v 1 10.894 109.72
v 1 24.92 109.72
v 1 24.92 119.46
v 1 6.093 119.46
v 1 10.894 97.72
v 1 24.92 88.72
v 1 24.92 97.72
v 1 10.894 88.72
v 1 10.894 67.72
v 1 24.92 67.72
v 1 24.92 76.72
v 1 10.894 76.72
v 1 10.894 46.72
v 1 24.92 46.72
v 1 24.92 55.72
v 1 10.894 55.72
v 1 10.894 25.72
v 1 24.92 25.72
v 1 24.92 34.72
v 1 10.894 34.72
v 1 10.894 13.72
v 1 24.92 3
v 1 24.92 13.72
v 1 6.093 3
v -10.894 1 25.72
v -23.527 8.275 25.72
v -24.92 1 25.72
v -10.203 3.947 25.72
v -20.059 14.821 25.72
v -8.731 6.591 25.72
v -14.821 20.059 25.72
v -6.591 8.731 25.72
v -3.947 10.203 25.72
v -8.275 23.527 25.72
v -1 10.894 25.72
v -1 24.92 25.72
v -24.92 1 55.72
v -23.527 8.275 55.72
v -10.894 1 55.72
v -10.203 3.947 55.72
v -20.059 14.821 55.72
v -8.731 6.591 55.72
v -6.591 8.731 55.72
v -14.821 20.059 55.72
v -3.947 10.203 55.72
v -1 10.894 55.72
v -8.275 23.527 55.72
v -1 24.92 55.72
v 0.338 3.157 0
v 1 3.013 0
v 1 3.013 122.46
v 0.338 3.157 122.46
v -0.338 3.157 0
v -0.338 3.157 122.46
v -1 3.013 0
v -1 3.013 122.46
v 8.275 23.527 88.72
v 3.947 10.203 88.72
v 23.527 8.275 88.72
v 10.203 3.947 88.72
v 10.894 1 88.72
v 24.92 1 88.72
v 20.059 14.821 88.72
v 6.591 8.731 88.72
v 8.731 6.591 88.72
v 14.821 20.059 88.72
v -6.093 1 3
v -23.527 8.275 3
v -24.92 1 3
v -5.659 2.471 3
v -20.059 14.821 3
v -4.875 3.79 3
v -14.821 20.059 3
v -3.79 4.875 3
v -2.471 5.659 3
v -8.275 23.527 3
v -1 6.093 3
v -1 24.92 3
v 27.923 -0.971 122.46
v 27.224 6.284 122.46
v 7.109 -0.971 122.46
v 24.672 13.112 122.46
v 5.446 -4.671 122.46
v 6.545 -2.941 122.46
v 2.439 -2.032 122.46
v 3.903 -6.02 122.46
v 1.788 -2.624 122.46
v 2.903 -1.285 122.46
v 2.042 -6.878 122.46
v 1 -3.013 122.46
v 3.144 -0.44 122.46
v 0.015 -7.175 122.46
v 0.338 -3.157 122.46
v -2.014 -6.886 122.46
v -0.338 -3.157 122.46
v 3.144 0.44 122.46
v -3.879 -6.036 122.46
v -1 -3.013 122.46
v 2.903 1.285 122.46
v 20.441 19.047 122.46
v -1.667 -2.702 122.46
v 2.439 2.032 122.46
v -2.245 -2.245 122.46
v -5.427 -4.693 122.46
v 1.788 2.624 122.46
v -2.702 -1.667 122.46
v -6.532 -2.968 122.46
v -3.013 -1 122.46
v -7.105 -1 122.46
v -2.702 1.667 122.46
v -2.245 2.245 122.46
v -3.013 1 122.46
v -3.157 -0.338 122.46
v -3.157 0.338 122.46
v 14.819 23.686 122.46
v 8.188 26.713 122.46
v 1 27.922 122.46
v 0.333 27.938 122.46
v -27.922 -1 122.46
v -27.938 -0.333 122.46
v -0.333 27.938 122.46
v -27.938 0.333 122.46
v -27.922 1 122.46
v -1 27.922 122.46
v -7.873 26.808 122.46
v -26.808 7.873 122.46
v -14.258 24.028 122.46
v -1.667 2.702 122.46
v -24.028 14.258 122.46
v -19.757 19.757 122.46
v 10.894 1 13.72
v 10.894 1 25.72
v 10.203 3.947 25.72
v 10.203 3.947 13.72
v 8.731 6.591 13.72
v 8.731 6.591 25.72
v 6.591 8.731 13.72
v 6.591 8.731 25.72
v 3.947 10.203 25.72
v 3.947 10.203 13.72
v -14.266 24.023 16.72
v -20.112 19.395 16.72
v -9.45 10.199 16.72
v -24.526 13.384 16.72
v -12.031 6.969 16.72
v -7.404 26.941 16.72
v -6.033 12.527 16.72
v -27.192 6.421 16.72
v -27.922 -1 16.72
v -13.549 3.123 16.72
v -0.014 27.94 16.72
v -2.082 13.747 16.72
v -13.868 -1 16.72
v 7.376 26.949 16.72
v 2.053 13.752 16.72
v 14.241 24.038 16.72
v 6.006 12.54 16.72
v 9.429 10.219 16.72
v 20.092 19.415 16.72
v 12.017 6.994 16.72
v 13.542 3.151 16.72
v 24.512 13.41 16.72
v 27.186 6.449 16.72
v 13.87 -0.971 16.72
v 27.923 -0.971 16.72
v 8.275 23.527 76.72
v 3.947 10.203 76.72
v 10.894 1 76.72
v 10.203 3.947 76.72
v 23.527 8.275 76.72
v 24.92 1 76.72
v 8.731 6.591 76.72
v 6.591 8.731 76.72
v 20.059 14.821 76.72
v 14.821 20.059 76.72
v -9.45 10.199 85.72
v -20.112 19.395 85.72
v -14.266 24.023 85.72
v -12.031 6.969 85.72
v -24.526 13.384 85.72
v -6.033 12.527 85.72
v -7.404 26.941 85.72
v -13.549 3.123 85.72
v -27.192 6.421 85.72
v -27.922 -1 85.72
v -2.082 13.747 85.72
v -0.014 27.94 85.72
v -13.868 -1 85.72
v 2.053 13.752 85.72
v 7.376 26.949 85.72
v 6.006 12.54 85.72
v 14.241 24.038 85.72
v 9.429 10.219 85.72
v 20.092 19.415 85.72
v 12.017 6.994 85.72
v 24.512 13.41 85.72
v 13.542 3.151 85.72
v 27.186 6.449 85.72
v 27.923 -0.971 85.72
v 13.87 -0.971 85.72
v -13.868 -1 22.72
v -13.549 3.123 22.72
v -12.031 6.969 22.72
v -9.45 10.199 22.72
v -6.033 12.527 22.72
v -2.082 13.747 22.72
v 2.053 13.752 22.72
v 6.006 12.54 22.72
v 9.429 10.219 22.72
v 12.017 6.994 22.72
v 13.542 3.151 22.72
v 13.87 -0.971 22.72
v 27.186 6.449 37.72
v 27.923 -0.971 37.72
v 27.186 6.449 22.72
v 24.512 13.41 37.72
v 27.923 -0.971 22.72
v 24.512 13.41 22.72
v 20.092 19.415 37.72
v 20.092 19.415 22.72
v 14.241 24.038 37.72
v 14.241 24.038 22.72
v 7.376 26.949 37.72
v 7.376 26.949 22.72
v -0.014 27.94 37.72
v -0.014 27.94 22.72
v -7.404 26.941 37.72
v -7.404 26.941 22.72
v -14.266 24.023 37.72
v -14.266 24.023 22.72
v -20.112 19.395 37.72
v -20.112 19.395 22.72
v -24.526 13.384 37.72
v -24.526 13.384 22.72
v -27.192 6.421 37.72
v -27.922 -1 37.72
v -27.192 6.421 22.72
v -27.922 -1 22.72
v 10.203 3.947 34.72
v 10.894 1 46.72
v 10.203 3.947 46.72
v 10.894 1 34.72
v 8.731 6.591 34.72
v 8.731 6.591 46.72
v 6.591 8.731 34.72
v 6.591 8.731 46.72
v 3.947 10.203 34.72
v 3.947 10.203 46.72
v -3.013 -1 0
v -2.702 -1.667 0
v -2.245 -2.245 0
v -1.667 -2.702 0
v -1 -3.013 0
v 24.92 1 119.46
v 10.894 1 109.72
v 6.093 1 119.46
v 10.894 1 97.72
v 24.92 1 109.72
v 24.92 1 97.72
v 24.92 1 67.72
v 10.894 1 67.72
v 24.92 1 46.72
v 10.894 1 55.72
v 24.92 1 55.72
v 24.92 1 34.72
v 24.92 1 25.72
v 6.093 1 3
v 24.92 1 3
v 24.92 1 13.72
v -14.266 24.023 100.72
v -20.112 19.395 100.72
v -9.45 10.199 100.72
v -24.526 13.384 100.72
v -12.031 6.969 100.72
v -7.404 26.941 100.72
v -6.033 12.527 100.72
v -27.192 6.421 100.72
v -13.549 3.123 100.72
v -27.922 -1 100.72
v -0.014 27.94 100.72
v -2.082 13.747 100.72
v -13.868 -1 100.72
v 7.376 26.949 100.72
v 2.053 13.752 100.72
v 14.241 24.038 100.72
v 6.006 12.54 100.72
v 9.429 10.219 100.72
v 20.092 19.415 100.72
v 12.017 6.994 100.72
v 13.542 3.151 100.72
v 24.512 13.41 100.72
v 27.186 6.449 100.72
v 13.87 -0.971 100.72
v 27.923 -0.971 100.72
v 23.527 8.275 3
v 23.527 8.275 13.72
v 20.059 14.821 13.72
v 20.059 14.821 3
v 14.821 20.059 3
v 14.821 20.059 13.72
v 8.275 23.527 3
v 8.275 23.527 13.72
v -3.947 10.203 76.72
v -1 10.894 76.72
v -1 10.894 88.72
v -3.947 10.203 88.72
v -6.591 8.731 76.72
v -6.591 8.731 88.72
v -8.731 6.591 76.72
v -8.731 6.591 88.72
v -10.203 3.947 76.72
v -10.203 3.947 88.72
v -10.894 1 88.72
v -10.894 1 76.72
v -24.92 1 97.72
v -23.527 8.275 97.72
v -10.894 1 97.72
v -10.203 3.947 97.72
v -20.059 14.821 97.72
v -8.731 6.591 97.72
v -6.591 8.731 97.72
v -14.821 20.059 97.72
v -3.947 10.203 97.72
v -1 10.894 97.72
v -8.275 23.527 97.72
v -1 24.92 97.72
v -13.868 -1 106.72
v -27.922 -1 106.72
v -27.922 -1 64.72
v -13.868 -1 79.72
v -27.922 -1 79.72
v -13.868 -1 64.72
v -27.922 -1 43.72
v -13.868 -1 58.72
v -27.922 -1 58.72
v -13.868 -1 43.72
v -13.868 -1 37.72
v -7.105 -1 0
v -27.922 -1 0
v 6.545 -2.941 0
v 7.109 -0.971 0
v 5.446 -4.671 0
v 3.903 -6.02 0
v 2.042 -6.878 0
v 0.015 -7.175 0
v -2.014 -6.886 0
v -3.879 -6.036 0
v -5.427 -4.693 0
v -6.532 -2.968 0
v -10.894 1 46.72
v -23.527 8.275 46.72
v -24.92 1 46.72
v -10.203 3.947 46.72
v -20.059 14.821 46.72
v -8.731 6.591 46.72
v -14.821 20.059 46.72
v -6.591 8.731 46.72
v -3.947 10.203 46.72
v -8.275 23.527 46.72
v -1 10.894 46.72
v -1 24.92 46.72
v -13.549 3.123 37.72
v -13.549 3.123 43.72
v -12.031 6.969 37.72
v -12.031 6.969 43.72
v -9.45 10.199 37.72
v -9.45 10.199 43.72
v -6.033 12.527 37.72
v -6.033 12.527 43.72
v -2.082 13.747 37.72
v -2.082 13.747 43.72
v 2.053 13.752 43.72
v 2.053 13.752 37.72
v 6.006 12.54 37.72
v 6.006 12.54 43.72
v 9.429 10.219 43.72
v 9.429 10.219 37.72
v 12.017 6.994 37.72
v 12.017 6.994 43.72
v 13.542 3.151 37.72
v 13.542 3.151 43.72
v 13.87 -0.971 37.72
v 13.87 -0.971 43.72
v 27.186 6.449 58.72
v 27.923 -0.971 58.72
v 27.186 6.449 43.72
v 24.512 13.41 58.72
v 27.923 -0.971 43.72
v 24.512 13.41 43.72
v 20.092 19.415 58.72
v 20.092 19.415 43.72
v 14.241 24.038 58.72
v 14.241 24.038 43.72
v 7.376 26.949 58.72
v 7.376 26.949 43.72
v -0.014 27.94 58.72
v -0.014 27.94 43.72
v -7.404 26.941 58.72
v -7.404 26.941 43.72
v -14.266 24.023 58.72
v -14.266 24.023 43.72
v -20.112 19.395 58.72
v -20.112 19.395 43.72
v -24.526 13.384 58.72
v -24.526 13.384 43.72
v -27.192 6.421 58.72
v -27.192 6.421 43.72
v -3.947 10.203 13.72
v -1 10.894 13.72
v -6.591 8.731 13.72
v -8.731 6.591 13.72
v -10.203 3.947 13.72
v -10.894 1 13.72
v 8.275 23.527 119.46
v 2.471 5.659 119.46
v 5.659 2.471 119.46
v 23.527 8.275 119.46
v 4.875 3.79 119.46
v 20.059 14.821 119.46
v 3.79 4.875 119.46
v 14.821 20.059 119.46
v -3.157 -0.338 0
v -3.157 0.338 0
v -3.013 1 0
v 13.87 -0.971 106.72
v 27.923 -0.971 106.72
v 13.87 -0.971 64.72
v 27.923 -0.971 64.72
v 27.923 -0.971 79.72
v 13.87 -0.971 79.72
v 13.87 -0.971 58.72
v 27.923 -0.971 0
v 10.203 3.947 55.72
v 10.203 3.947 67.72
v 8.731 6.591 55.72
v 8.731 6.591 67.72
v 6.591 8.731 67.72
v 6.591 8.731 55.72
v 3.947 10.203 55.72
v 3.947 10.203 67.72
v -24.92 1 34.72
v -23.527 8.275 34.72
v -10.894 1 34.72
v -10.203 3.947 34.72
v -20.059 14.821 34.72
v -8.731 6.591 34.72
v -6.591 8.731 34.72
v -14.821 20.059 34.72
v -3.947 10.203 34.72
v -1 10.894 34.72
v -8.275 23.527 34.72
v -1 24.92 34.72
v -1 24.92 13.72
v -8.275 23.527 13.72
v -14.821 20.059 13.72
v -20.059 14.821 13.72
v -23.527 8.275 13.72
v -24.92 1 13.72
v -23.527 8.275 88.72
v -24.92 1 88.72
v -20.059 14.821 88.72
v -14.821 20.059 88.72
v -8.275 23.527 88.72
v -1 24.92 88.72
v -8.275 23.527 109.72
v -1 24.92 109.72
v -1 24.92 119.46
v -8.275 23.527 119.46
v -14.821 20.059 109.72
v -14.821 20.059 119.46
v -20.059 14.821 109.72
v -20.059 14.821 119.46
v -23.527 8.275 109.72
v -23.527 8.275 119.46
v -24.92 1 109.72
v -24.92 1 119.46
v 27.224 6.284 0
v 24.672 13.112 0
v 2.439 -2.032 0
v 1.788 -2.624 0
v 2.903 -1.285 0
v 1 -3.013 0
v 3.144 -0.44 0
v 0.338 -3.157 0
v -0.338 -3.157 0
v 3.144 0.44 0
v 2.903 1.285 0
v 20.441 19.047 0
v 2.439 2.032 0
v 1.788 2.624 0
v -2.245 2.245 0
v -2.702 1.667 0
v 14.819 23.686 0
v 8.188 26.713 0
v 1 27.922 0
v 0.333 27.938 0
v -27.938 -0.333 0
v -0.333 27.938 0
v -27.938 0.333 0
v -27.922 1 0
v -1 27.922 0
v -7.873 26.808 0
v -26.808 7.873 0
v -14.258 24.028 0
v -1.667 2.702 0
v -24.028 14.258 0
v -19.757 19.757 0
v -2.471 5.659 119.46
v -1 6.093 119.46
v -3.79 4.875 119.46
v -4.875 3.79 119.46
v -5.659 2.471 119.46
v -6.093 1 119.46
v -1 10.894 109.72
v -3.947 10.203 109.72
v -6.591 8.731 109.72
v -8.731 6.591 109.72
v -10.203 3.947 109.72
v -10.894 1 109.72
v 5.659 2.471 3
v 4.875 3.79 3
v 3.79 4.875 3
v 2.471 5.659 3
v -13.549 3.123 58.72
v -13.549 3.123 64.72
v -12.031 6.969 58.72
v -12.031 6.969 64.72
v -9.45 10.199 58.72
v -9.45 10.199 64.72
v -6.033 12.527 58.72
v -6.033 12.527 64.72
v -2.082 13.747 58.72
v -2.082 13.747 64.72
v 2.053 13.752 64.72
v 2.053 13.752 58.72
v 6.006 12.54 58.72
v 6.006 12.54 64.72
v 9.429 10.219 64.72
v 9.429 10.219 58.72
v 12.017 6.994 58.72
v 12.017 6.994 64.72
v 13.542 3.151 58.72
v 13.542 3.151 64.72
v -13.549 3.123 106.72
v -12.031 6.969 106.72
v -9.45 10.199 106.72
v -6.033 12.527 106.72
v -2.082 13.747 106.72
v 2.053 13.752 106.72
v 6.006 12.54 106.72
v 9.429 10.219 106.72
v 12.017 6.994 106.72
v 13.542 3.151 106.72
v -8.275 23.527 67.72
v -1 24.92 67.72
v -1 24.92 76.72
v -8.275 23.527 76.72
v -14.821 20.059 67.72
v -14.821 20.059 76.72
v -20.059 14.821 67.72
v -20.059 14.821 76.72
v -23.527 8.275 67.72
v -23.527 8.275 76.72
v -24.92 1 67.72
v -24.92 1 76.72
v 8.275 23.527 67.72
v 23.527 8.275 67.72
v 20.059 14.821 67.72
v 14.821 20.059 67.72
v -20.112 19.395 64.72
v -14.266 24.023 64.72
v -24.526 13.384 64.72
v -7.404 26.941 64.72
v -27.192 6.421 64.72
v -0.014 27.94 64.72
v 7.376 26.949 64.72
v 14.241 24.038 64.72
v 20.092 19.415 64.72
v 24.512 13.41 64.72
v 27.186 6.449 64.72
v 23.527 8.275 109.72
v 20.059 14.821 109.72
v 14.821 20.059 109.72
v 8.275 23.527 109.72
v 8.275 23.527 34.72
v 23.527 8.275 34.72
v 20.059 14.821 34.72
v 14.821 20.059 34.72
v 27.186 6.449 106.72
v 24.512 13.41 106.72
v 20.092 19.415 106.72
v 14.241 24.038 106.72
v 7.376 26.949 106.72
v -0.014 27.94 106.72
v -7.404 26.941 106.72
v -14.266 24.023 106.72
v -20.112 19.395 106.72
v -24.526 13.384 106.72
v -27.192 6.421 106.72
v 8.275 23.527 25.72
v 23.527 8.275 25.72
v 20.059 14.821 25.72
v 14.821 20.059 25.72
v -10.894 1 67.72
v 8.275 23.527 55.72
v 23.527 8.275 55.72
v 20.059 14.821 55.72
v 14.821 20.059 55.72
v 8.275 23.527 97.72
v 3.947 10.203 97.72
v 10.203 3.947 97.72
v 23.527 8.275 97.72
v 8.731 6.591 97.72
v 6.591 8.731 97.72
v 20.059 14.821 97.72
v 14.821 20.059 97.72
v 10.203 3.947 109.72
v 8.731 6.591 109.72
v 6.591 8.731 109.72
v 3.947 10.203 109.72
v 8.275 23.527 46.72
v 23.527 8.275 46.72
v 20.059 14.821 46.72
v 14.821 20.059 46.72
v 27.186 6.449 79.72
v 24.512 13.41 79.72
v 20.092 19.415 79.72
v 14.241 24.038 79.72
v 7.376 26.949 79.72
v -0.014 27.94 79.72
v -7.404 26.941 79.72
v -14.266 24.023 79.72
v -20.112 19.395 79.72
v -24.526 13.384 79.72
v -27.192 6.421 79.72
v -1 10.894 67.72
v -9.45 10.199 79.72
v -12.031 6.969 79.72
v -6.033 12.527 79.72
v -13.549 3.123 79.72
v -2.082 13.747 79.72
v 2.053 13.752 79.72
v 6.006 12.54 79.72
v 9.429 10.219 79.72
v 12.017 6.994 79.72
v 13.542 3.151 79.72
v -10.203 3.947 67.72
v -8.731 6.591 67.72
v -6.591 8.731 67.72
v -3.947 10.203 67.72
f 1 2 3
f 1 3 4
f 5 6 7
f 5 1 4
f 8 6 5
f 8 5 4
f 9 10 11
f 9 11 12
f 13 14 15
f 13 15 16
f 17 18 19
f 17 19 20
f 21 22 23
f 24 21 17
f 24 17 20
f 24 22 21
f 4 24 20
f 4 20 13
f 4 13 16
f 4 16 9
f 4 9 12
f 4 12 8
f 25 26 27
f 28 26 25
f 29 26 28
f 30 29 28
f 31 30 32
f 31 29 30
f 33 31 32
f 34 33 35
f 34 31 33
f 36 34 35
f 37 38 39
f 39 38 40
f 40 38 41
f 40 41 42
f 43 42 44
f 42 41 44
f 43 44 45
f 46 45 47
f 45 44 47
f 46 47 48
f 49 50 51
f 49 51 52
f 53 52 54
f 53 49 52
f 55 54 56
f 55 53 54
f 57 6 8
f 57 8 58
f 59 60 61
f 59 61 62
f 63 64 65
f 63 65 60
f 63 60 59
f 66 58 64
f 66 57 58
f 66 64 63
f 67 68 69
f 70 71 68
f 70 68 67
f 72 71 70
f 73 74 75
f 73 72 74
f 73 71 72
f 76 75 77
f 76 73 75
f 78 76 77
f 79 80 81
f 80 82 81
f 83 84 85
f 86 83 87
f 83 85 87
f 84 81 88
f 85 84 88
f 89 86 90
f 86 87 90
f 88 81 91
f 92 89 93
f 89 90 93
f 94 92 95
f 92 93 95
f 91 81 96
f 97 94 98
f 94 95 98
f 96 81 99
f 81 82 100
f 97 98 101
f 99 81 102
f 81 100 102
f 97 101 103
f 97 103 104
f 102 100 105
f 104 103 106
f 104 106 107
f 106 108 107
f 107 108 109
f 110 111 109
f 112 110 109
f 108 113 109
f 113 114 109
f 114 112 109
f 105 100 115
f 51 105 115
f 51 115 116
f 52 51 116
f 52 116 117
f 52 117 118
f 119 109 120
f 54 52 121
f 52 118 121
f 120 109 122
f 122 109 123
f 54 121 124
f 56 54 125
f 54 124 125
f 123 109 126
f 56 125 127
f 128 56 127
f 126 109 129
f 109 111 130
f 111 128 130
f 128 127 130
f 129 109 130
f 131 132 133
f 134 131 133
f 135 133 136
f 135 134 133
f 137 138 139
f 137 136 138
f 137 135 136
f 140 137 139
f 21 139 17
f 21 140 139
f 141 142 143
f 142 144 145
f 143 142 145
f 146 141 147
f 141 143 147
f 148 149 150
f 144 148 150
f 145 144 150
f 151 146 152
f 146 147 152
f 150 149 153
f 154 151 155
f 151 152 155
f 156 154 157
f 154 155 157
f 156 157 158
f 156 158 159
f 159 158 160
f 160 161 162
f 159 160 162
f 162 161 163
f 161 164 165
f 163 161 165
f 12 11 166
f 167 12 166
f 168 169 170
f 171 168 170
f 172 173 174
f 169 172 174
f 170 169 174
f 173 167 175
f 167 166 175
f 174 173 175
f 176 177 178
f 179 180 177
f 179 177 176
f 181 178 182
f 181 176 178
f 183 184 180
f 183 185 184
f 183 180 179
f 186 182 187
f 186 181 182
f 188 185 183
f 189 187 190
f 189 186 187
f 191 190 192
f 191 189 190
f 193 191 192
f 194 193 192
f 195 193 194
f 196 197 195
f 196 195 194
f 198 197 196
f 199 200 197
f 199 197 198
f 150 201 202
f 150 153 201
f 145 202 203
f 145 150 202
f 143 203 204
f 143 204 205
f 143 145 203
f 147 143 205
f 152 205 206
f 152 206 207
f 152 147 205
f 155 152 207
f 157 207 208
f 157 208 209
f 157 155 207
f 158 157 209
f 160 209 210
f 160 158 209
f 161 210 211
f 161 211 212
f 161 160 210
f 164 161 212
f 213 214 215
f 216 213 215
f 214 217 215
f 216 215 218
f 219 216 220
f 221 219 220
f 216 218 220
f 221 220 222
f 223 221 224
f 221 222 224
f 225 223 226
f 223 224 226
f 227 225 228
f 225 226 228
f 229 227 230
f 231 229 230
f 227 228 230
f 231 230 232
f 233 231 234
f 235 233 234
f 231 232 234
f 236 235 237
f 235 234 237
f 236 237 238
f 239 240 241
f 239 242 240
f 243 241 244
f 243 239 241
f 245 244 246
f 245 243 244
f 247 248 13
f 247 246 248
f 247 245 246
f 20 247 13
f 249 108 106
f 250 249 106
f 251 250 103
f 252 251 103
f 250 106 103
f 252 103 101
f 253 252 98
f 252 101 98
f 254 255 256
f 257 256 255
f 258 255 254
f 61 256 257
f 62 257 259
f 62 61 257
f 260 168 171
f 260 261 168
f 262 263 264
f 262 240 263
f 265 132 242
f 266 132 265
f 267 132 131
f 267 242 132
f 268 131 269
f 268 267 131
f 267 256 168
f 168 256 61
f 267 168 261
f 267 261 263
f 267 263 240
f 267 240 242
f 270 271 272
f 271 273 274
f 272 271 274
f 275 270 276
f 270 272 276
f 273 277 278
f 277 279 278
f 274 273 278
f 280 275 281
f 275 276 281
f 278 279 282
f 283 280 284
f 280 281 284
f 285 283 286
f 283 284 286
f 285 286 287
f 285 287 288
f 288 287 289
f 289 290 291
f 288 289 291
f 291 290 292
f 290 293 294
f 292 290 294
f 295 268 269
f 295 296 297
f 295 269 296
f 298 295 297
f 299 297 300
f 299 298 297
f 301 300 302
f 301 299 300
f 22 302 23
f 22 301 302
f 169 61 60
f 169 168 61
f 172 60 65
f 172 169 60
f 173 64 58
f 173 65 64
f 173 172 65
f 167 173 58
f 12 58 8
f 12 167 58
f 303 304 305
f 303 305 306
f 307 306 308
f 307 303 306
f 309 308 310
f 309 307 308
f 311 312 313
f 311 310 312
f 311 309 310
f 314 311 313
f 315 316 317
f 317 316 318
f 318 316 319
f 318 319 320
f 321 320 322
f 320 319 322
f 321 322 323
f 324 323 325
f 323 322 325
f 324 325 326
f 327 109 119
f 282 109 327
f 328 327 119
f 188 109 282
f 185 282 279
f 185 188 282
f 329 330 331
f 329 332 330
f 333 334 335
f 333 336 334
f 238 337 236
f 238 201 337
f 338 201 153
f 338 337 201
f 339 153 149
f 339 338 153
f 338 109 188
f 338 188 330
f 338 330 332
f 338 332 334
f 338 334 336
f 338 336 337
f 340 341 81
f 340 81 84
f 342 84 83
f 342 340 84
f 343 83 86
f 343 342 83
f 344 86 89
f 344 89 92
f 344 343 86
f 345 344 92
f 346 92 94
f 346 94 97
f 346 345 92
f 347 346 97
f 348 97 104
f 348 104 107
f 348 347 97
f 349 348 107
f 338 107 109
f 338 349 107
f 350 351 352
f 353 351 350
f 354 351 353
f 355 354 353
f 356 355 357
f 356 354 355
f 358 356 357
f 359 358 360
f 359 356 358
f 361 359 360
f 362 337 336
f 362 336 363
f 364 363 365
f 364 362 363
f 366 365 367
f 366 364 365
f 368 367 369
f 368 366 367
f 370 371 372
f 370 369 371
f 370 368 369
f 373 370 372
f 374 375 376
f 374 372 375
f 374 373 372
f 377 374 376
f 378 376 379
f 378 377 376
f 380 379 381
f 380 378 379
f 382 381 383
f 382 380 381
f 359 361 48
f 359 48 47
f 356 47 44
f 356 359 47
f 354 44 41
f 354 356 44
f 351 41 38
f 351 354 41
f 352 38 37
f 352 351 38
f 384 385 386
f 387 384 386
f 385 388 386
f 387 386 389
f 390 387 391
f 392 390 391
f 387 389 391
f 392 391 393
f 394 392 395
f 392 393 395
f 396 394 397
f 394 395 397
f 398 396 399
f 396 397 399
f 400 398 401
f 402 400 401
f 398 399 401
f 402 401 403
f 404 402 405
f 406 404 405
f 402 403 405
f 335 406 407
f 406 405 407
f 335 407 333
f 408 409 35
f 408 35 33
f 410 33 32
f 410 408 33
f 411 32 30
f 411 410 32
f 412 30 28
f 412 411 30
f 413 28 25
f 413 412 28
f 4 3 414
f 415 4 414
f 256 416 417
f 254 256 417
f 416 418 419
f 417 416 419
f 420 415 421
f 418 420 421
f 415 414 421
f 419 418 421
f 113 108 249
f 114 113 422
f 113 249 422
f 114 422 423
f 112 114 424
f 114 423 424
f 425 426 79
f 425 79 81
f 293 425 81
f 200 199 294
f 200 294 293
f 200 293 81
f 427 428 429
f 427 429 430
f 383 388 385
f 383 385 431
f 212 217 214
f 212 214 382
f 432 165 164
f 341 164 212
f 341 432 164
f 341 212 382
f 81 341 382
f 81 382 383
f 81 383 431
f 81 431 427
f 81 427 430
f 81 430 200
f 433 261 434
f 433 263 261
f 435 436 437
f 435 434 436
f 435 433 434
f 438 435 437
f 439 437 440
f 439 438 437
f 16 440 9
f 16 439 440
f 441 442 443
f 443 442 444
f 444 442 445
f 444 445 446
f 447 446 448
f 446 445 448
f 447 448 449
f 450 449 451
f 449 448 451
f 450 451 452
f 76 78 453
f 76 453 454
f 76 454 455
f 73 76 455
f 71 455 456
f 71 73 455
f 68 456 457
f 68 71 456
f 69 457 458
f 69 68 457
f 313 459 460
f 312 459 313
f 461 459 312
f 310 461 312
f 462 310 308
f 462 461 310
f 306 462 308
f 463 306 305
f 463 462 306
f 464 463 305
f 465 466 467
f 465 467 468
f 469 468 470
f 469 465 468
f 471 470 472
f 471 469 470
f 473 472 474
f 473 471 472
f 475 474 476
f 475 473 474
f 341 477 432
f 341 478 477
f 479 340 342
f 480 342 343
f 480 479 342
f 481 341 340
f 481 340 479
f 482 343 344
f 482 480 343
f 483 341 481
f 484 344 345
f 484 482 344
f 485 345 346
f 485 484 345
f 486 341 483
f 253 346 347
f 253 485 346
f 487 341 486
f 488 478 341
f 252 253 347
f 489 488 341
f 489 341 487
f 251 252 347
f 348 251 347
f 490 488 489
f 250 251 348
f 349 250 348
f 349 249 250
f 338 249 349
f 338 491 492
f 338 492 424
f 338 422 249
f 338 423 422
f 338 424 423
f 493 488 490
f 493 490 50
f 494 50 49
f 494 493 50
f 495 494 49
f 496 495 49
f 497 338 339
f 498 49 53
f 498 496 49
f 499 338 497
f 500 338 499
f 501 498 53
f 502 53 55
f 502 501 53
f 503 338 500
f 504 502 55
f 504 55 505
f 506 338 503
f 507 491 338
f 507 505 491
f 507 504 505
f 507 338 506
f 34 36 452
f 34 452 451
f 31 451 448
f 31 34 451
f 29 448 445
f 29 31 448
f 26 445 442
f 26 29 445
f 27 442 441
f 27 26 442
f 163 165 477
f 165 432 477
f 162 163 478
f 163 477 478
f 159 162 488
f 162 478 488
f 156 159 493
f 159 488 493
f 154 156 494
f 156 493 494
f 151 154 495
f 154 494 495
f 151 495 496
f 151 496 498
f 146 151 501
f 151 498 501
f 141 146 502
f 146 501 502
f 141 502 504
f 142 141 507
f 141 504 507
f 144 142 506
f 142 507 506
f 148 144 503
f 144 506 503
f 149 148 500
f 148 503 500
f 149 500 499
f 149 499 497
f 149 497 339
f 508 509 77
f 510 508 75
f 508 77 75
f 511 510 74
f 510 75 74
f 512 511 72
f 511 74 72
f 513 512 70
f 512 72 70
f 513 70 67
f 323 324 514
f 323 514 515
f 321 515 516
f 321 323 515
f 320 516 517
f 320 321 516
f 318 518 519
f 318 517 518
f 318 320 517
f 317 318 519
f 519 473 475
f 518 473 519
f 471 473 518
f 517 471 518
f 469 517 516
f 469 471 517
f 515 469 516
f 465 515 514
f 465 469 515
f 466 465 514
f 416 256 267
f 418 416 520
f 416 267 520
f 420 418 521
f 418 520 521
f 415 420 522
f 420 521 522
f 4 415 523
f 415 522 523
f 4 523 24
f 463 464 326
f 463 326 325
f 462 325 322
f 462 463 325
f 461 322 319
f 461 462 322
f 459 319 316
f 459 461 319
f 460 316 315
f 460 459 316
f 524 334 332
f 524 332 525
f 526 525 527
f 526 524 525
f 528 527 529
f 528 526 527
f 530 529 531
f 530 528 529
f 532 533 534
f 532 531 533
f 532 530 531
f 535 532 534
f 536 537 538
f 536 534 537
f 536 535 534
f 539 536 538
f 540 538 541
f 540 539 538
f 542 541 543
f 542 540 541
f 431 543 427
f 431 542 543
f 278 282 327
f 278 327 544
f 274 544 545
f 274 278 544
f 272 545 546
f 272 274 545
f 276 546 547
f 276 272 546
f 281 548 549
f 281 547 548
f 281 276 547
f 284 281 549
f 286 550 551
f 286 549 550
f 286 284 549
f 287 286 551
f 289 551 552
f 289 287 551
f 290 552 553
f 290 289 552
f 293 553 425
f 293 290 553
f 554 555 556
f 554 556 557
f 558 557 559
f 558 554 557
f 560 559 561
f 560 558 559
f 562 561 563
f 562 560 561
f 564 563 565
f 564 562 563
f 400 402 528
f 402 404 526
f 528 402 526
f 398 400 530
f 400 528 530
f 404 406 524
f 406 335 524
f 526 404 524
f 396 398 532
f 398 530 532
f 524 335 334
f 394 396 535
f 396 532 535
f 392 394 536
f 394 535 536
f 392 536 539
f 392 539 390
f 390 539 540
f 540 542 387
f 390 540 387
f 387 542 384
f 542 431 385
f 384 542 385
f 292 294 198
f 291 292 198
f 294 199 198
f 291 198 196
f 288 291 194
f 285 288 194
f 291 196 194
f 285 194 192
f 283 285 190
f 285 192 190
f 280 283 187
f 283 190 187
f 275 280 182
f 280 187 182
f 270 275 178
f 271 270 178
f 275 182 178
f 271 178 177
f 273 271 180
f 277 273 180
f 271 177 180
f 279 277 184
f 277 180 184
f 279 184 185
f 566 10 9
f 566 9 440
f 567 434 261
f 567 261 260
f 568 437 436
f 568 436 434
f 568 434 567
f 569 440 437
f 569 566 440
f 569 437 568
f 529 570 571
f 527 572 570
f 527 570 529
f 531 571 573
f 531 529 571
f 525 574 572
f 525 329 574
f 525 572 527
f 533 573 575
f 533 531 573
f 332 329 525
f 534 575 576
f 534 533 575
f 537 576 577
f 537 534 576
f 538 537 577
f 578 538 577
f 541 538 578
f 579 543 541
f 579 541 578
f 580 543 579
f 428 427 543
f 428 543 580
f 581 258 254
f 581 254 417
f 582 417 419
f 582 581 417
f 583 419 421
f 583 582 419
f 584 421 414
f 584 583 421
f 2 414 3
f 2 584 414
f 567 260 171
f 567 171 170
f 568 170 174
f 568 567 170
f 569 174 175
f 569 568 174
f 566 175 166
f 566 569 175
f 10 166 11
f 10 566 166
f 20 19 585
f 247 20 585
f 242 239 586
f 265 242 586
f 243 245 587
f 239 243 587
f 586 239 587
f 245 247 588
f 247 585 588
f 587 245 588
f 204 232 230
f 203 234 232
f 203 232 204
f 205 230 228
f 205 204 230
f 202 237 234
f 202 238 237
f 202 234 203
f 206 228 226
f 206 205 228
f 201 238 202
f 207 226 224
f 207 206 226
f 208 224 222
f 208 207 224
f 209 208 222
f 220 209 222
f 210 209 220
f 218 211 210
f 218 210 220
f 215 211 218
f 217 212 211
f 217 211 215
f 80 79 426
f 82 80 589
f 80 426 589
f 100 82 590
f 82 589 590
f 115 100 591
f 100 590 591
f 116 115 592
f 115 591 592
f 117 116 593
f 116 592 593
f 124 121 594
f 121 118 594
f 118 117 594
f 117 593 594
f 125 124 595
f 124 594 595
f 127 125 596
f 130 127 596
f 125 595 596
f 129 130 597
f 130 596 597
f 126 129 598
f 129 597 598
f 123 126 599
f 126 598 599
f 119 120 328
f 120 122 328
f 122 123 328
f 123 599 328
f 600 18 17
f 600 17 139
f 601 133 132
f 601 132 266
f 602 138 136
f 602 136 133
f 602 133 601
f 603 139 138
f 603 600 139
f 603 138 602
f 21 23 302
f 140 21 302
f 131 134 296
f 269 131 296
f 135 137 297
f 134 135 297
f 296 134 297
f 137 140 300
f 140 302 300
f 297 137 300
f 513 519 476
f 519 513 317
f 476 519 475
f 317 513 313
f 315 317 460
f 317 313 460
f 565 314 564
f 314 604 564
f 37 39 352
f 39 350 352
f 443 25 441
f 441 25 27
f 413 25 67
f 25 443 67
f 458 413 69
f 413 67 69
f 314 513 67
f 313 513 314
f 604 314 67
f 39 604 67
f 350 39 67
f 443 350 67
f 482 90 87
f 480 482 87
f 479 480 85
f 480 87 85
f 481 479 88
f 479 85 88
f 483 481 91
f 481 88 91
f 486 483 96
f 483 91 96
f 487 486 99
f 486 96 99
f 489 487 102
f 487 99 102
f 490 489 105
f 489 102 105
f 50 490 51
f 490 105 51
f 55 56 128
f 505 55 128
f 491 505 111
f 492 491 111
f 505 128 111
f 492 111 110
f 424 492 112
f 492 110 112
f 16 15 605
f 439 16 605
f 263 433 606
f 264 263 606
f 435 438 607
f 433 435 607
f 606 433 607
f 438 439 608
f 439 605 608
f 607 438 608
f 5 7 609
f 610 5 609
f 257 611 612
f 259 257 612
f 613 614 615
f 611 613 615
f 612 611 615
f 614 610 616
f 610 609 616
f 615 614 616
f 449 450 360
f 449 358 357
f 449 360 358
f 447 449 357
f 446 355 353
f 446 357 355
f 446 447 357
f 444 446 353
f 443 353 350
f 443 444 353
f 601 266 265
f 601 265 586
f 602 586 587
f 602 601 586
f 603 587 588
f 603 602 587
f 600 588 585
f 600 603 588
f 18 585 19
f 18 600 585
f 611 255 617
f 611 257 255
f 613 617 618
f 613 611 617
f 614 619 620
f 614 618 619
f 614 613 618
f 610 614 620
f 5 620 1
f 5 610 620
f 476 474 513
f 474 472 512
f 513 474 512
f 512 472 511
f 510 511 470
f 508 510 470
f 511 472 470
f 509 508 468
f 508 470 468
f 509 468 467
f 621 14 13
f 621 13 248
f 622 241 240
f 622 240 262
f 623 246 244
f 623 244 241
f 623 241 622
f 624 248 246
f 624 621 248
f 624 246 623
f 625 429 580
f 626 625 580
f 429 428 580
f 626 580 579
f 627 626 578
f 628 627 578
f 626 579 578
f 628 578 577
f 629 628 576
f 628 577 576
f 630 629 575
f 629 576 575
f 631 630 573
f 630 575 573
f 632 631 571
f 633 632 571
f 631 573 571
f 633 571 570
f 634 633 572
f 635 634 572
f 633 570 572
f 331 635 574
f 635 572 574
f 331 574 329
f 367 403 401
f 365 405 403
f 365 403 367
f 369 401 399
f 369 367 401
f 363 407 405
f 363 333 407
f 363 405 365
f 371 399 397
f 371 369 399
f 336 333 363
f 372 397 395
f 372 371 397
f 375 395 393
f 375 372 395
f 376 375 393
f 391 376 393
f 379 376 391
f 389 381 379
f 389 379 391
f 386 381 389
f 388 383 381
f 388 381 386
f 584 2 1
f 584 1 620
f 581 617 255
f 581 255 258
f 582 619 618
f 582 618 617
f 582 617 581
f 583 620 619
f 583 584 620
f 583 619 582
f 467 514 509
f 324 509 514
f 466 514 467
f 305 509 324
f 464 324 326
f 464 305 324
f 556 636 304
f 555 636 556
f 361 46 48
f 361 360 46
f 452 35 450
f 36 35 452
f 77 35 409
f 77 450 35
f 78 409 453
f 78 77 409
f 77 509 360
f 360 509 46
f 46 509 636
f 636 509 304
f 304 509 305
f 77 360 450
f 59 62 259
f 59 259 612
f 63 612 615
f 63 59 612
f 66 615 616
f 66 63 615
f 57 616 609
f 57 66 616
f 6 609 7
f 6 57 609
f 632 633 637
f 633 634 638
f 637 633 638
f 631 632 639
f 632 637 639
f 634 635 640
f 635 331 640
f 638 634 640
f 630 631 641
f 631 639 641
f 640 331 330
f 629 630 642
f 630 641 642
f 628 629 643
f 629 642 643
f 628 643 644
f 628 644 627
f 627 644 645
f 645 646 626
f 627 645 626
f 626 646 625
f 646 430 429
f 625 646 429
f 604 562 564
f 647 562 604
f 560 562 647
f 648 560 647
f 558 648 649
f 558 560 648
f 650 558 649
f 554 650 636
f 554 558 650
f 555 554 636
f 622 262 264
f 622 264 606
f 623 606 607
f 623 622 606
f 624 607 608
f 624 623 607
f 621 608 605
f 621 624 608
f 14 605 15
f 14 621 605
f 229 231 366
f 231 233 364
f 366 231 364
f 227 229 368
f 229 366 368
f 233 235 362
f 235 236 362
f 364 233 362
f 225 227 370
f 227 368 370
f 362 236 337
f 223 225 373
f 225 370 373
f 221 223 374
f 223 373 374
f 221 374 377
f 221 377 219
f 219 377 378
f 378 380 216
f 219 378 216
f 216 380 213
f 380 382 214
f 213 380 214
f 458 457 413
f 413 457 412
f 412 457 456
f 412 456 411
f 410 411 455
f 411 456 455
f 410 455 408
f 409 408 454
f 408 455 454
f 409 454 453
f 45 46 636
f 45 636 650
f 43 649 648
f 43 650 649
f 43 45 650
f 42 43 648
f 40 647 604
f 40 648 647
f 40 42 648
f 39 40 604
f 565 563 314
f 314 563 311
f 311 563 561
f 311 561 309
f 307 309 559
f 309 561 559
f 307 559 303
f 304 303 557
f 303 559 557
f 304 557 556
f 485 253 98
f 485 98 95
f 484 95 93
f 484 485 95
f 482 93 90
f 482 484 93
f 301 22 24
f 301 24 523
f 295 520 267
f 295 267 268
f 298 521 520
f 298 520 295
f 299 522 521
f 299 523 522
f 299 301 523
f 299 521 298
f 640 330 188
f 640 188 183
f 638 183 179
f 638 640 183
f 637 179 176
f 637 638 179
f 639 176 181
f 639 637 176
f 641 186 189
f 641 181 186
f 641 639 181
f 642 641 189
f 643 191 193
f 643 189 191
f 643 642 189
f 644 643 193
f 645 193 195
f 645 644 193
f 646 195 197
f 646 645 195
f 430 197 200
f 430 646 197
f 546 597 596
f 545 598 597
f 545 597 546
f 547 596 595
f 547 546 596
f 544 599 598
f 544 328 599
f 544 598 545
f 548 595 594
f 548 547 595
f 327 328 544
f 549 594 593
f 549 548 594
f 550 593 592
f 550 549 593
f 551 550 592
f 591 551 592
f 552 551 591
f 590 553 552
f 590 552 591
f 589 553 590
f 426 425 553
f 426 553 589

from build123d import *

# Parameters (mm, degrees)
SKETCH3_R            = 27.94
BOSS_EXTRUDE2_DEPTH  = 122.46
SKETCH5_R            = 3.175
CUT_EXTRUDE1_DEPTH   = 129.676877488
SKETCH4_W            = 14
SKETCH4_H            = 6
SHELL1_START         = 3
SHELL1_OUTLINE_R     = 10.94
SHELL1_OUTLINE_R_2   = 6.175
SHELL1_DEPTH         = 116.46
SHELL1_2_OUTLINE_R   = 24.94
SHELL1_2_OUTLINE_R_2 = 10.94
SHELL1_2_DEPTH       = 10.72
SHELL1_START_2       = 109.72
SHELL1_3_OUTLINE_R   = 24.94
SHELL1_3_OUTLINE_R_2 = 10.94
SHELL1_3_DEPTH       = 9.74
SHELL1_START_3       = 25.72
SHELL1_4_OUTLINE_R   = 24.94
SHELL1_4_OUTLINE_R_2 = 10.94
SHELL1_4_DEPTH       = 9
SHELL1_START_4       = 46.72
SHELL1_5_OUTLINE_R   = 24.94
SHELL1_5_OUTLINE_R_2 = 10.94
SHELL1_5_DEPTH       = 9
SHELL1_START_5       = 67.72
SHELL1_6_OUTLINE_R   = 24.94
SHELL1_6_OUTLINE_R_2 = 10.94
SHELL1_6_DEPTH       = 9
SHELL1_START_6       = 88.72
SHELL1_7_OUTLINE_R   = 24.94
SHELL1_7_OUTLINE_R_2 = 10.94
SHELL1_7_DEPTH       = 9
BOSS_EXTRUDE3_REACH  = 130.677
SKETCH13_W           = 16.483162312
SKETCH13_H           = 6
CUT_EXTRUDE3_DEPTH   = 123
BOSS_EXTRUDE4_DEPTH  = 122.46


# Read off the part's stored shape, not the designer's step: Shell1
with BuildPart() as part:
    # Sketch3 → Boss-Extrude2 (new body)
    with BuildSketch(Plane.XY):
        Circle(SKETCH3_R)
    extrude(amount=BOSS_EXTRUDE2_DEPTH)

    # Sketch5 → Cut-Extrude1 (cut, through all)
    with BuildSketch(Plane.XY.offset(122.46)):
        Circle(SKETCH5_R)
    extrude(amount=-CUT_EXTRUDE1_DEPTH, mode=Mode.SUBTRACT)

    # Sketch4 → Cut-Revolve1 (revolve, cut)
    with BuildSketch(Plane(origin=(0, 0, 0), x_dir=(1, 0, 0), z_dir=(0, 1, 0)), mode=Mode.PRIVATE) as cut_revolve1_sk:
        with Locations((-20.94, -103.72)):
            Rectangle(SKETCH4_W, SKETCH4_H)
        with Locations((-20.94, -82.72)):
            Rectangle(SKETCH4_W, SKETCH4_H)
        with Locations((-20.94, -61.72)):
            Rectangle(SKETCH4_W, SKETCH4_H)
        with Locations((-20.94, -40.72)):
            Rectangle(SKETCH4_W, SKETCH4_H)
        with Locations((-20.94, -19.72)):
            Rectangle(SKETCH4_W, SKETCH4_H)
    revolve(cut_revolve1_sk.sketch.rotate(Axis((0, 0, 122.46), (0, 0, -1)), 180), axis=Axis((0, 0, 122.46), (0, 0, -1)), mode=Mode.SUBTRACT)

    # Shell1 outline → Shell1 (cut)
    with BuildSketch(Plane.XY.offset(SHELL1_START)):
        Circle(SHELL1_OUTLINE_R)
        Circle(SHELL1_OUTLINE_R_2, mode=Mode.SUBTRACT)
    extrude(amount=SHELL1_DEPTH, mode=Mode.SUBTRACT)

    # Shell1 2 outline → Shell1 2 (cut)
    with BuildSketch(Plane.XY.offset(SHELL1_START)):
        Circle(SHELL1_2_OUTLINE_R)
        Circle(SHELL1_2_OUTLINE_R_2, mode=Mode.SUBTRACT)
    extrude(amount=SHELL1_2_DEPTH, mode=Mode.SUBTRACT)

    # Shell1 3 outline → Shell1 3 (cut)
    with BuildSketch(Plane.XY.offset(SHELL1_START_2)):
        Circle(SHELL1_3_OUTLINE_R)
        Circle(SHELL1_3_OUTLINE_R_2, mode=Mode.SUBTRACT)
    extrude(amount=SHELL1_3_DEPTH, mode=Mode.SUBTRACT)

    # Shell1 4 outline → Shell1 4 (cut)
    with BuildSketch(Plane.XY.offset(SHELL1_START_3)):
        Circle(SHELL1_4_OUTLINE_R)
        Circle(SHELL1_4_OUTLINE_R_2, mode=Mode.SUBTRACT)
    extrude(amount=SHELL1_4_DEPTH, mode=Mode.SUBTRACT)

    # Shell1 5 outline → Shell1 5 (cut)
    with BuildSketch(Plane.XY.offset(SHELL1_START_4)):
        Circle(SHELL1_5_OUTLINE_R)
        Circle(SHELL1_5_OUTLINE_R_2, mode=Mode.SUBTRACT)
    extrude(amount=SHELL1_5_DEPTH, mode=Mode.SUBTRACT)

    # Shell1 6 outline → Shell1 6 (cut)
    with BuildSketch(Plane.XY.offset(SHELL1_START_5)):
        Circle(SHELL1_6_OUTLINE_R)
        Circle(SHELL1_6_OUTLINE_R_2, mode=Mode.SUBTRACT)
    extrude(amount=SHELL1_6_DEPTH, mode=Mode.SUBTRACT)

    # Shell1 7 outline → Shell1 7 (cut)
    with BuildSketch(Plane.XY.offset(SHELL1_START_6)):
        Circle(SHELL1_7_OUTLINE_R)
        Circle(SHELL1_7_OUTLINE_R_2, mode=Mode.SUBTRACT)
    extrude(amount=SHELL1_7_DEPTH, mode=Mode.SUBTRACT)

    # Boss-Extrude3: up to this face of the body (flat: up to its plane)
    boss_extrude3_end = Plane(part.part.faces().sort_by_distance((-27.149737461, 0, 122.46))[0])
    # Sketch10 → Boss-Extrude3 (add, up to the picked face)
    with BuildSketch(Plane(origin=(0, 0, 0), x_dir=(-1, 0, 0), z_dir=(0, 0, -1)), mode=Mode.PRIVATE) as boss_extrude3_sk1:
        with BuildLine():
            Line((-1, 27.922098775), (-1, 3.01340754))
            ThreePointArc((-1, 3.01340754), (0, 3.175), (1, 3.01340754))
            Line((1, 3.01340754), (1, 27.922098775))
            ThreePointArc((1, 27.922098775), (0, 27.94), (-1, 27.922098775))
        make_face()
    boss_extrude3_tool1 = split(extrude(boss_extrude3_sk1.sketch, amount=-BOSS_EXTRUDE3_REACH, mode=Mode.PRIVATE), bisect_by=boss_extrude3_end, keep=Keep.BOTH, mode=Mode.PRIVATE)
    # Sketch10 → Boss-Extrude3 (add, up to the picked face)
    with BuildSketch(Plane(origin=(0, 0, 0), x_dir=(-1, 0, 0), z_dir=(0, 0, -1)), mode=Mode.PRIVATE) as boss_extrude3_sk2:
        with BuildLine():
            Line((3.01340754, 1), (27.922098775, 1))
            ThreePointArc((27.922098775, 1), (27.94, 0), (27.922098775, -1))
            Line((27.922098775, -1), (3.01340754, -1))
            ThreePointArc((3.01340754, -1), (3.175, 0), (3.01340754, 1))
        make_face()
    boss_extrude3_tool2 = split(extrude(boss_extrude3_sk2.sketch, amount=-BOSS_EXTRUDE3_REACH, mode=Mode.PRIVATE), bisect_by=boss_extrude3_end, keep=Keep.BOTH, mode=Mode.PRIVATE)
    # Sketch10 → Boss-Extrude3 (add, up to the picked face)
    with BuildSketch(Plane(origin=(0, 0, 0), x_dir=(-1, 0, 0), z_dir=(0, 0, -1)), mode=Mode.PRIVATE) as boss_extrude3_sk3:
        with BuildLine():
            Line((-1, -3.01340754), (-1, -27.922098775))
            ThreePointArc((-1, -27.922098775), (0, -27.94), (1, -27.922098775))
            Line((1, -27.922098775), (1, -3.01340754))
            ThreePointArc((1, -3.01340754), (0, -3.175), (-1, -3.01340754))
        make_face()
    boss_extrude3_tool3 = split(extrude(boss_extrude3_sk3.sketch, amount=-BOSS_EXTRUDE3_REACH, mode=Mode.PRIVATE), bisect_by=boss_extrude3_end, keep=Keep.BOTH, mode=Mode.PRIVATE)
    # Sketch10 → Boss-Extrude3 (add, up to the picked face)
    with BuildSketch(Plane(origin=(0, 0, 0), x_dir=(-1, 0, 0), z_dir=(0, 0, -1)), mode=Mode.PRIVATE) as boss_extrude3_sk4:
        with BuildLine():
            Line((-27.922098775, -1), (-3.01340754, -1))
            ThreePointArc((-3.01340754, -1), (-3.175, 0), (-3.01340754, 1))
            Line((-3.01340754, 1), (-27.922098775, 1))
            ThreePointArc((-27.922098775, 1), (-27.94, 0), (-27.922098775, -1))
        make_face()
    boss_extrude3_tool4 = split(extrude(boss_extrude3_sk4.sketch, amount=-BOSS_EXTRUDE3_REACH, mode=Mode.PRIVATE), bisect_by=boss_extrude3_end, keep=Keep.BOTH, mode=Mode.PRIVATE)
    add(boss_extrude3_tool1.solids().sort_by(Axis((0, 15.527819, 0), (0, 0, 1)))[0])
    add(boss_extrude3_tool2.solids().sort_by(Axis((-15.527819, 0, 0), (0, 0, 1)))[0])
    add(boss_extrude3_tool3.solids().sort_by(Axis((0, -15.527819, 0), (0, 0, 1)))[0])
    add(boss_extrude3_tool4.solids().sort_by(Axis((15.527819, 0, 0), (0, 0, 1)))[0])

    # Sketch13 → Cut-Revolve2 (revolve, cut)
    with BuildSketch(Plane(origin=(0, 0, 0), x_dir=(1, 0, 0), z_dir=(0, 1, 0)), mode=Mode.PRIVATE) as cut_revolve2_sk:
        with Locations((-22.145666886, -40.72)):
            Rectangle(SKETCH13_W, SKETCH13_H)
        with Locations((-22.145666886, -19.72)):
            Rectangle(SKETCH13_W, SKETCH13_H)
        with Locations((-22.145666886, -61.72)):
            Rectangle(SKETCH13_W, SKETCH13_H)
        with Locations((-22.145666886, -82.72)):
            Rectangle(SKETCH13_W, SKETCH13_H)
        with Locations((-22.145666886, -103.72)):
            Rectangle(SKETCH13_W, SKETCH13_H)
    revolve(cut_revolve2_sk.sketch.rotate(Axis((0, 0, 121.588746248), (0, 0, -1)), 180), axis=Axis((0, 0, 121.588746248), (0, 0, -1)), mode=Mode.SUBTRACT)

    # Sketch16 → Cut-Extrude3 (cut)
    with BuildSketch(Plane(origin=(0, 0, 0), x_dir=(-1, 0, 0), z_dir=(0, 0, -1))):
        with BuildLine():
            Line((-27.923120749, -0.971044624), (-6.098171639, -0.971044624))
            ThreePointArc((-6.098171639, -0.971044624), (-0.014665674, -6.174982584), (6.093490379, -1))
            Line((6.093490379, -1), (27.922098775, -1))
            ThreePointArc((27.922098775, -1), (-0.014486703, -27.939996244), (-27.923120749, -0.971044624))
        make_face()
    extrude(amount=-CUT_EXTRUDE3_DEPTH, mode=Mode.SUBTRACT)

    # Sketch17 → Boss-Extrude4 (add)
    with BuildSketch(Plane(origin=(0, 0, 0), x_dir=(-1, 0, 0), z_dir=(0, 0, -1))):
        with BuildLine():
            Line((-6.098171639, -0.971044624), (-7.108987082, -0.971044624))
            ThreePointArc((-7.108987082, -0.971044624), (-0.014616223, -7.174985113), (7.104971851, -1))
            Line((7.104971851, -1), (6.093490379, -1))
            ThreePointArc((6.093490379, -1), (-0.014665674, -6.174982584), (-6.098171639, -0.971044624))
        make_face()
    extrude(amount=-BOSS_EXTRUDE4_DEPTH)


solid = part.part
